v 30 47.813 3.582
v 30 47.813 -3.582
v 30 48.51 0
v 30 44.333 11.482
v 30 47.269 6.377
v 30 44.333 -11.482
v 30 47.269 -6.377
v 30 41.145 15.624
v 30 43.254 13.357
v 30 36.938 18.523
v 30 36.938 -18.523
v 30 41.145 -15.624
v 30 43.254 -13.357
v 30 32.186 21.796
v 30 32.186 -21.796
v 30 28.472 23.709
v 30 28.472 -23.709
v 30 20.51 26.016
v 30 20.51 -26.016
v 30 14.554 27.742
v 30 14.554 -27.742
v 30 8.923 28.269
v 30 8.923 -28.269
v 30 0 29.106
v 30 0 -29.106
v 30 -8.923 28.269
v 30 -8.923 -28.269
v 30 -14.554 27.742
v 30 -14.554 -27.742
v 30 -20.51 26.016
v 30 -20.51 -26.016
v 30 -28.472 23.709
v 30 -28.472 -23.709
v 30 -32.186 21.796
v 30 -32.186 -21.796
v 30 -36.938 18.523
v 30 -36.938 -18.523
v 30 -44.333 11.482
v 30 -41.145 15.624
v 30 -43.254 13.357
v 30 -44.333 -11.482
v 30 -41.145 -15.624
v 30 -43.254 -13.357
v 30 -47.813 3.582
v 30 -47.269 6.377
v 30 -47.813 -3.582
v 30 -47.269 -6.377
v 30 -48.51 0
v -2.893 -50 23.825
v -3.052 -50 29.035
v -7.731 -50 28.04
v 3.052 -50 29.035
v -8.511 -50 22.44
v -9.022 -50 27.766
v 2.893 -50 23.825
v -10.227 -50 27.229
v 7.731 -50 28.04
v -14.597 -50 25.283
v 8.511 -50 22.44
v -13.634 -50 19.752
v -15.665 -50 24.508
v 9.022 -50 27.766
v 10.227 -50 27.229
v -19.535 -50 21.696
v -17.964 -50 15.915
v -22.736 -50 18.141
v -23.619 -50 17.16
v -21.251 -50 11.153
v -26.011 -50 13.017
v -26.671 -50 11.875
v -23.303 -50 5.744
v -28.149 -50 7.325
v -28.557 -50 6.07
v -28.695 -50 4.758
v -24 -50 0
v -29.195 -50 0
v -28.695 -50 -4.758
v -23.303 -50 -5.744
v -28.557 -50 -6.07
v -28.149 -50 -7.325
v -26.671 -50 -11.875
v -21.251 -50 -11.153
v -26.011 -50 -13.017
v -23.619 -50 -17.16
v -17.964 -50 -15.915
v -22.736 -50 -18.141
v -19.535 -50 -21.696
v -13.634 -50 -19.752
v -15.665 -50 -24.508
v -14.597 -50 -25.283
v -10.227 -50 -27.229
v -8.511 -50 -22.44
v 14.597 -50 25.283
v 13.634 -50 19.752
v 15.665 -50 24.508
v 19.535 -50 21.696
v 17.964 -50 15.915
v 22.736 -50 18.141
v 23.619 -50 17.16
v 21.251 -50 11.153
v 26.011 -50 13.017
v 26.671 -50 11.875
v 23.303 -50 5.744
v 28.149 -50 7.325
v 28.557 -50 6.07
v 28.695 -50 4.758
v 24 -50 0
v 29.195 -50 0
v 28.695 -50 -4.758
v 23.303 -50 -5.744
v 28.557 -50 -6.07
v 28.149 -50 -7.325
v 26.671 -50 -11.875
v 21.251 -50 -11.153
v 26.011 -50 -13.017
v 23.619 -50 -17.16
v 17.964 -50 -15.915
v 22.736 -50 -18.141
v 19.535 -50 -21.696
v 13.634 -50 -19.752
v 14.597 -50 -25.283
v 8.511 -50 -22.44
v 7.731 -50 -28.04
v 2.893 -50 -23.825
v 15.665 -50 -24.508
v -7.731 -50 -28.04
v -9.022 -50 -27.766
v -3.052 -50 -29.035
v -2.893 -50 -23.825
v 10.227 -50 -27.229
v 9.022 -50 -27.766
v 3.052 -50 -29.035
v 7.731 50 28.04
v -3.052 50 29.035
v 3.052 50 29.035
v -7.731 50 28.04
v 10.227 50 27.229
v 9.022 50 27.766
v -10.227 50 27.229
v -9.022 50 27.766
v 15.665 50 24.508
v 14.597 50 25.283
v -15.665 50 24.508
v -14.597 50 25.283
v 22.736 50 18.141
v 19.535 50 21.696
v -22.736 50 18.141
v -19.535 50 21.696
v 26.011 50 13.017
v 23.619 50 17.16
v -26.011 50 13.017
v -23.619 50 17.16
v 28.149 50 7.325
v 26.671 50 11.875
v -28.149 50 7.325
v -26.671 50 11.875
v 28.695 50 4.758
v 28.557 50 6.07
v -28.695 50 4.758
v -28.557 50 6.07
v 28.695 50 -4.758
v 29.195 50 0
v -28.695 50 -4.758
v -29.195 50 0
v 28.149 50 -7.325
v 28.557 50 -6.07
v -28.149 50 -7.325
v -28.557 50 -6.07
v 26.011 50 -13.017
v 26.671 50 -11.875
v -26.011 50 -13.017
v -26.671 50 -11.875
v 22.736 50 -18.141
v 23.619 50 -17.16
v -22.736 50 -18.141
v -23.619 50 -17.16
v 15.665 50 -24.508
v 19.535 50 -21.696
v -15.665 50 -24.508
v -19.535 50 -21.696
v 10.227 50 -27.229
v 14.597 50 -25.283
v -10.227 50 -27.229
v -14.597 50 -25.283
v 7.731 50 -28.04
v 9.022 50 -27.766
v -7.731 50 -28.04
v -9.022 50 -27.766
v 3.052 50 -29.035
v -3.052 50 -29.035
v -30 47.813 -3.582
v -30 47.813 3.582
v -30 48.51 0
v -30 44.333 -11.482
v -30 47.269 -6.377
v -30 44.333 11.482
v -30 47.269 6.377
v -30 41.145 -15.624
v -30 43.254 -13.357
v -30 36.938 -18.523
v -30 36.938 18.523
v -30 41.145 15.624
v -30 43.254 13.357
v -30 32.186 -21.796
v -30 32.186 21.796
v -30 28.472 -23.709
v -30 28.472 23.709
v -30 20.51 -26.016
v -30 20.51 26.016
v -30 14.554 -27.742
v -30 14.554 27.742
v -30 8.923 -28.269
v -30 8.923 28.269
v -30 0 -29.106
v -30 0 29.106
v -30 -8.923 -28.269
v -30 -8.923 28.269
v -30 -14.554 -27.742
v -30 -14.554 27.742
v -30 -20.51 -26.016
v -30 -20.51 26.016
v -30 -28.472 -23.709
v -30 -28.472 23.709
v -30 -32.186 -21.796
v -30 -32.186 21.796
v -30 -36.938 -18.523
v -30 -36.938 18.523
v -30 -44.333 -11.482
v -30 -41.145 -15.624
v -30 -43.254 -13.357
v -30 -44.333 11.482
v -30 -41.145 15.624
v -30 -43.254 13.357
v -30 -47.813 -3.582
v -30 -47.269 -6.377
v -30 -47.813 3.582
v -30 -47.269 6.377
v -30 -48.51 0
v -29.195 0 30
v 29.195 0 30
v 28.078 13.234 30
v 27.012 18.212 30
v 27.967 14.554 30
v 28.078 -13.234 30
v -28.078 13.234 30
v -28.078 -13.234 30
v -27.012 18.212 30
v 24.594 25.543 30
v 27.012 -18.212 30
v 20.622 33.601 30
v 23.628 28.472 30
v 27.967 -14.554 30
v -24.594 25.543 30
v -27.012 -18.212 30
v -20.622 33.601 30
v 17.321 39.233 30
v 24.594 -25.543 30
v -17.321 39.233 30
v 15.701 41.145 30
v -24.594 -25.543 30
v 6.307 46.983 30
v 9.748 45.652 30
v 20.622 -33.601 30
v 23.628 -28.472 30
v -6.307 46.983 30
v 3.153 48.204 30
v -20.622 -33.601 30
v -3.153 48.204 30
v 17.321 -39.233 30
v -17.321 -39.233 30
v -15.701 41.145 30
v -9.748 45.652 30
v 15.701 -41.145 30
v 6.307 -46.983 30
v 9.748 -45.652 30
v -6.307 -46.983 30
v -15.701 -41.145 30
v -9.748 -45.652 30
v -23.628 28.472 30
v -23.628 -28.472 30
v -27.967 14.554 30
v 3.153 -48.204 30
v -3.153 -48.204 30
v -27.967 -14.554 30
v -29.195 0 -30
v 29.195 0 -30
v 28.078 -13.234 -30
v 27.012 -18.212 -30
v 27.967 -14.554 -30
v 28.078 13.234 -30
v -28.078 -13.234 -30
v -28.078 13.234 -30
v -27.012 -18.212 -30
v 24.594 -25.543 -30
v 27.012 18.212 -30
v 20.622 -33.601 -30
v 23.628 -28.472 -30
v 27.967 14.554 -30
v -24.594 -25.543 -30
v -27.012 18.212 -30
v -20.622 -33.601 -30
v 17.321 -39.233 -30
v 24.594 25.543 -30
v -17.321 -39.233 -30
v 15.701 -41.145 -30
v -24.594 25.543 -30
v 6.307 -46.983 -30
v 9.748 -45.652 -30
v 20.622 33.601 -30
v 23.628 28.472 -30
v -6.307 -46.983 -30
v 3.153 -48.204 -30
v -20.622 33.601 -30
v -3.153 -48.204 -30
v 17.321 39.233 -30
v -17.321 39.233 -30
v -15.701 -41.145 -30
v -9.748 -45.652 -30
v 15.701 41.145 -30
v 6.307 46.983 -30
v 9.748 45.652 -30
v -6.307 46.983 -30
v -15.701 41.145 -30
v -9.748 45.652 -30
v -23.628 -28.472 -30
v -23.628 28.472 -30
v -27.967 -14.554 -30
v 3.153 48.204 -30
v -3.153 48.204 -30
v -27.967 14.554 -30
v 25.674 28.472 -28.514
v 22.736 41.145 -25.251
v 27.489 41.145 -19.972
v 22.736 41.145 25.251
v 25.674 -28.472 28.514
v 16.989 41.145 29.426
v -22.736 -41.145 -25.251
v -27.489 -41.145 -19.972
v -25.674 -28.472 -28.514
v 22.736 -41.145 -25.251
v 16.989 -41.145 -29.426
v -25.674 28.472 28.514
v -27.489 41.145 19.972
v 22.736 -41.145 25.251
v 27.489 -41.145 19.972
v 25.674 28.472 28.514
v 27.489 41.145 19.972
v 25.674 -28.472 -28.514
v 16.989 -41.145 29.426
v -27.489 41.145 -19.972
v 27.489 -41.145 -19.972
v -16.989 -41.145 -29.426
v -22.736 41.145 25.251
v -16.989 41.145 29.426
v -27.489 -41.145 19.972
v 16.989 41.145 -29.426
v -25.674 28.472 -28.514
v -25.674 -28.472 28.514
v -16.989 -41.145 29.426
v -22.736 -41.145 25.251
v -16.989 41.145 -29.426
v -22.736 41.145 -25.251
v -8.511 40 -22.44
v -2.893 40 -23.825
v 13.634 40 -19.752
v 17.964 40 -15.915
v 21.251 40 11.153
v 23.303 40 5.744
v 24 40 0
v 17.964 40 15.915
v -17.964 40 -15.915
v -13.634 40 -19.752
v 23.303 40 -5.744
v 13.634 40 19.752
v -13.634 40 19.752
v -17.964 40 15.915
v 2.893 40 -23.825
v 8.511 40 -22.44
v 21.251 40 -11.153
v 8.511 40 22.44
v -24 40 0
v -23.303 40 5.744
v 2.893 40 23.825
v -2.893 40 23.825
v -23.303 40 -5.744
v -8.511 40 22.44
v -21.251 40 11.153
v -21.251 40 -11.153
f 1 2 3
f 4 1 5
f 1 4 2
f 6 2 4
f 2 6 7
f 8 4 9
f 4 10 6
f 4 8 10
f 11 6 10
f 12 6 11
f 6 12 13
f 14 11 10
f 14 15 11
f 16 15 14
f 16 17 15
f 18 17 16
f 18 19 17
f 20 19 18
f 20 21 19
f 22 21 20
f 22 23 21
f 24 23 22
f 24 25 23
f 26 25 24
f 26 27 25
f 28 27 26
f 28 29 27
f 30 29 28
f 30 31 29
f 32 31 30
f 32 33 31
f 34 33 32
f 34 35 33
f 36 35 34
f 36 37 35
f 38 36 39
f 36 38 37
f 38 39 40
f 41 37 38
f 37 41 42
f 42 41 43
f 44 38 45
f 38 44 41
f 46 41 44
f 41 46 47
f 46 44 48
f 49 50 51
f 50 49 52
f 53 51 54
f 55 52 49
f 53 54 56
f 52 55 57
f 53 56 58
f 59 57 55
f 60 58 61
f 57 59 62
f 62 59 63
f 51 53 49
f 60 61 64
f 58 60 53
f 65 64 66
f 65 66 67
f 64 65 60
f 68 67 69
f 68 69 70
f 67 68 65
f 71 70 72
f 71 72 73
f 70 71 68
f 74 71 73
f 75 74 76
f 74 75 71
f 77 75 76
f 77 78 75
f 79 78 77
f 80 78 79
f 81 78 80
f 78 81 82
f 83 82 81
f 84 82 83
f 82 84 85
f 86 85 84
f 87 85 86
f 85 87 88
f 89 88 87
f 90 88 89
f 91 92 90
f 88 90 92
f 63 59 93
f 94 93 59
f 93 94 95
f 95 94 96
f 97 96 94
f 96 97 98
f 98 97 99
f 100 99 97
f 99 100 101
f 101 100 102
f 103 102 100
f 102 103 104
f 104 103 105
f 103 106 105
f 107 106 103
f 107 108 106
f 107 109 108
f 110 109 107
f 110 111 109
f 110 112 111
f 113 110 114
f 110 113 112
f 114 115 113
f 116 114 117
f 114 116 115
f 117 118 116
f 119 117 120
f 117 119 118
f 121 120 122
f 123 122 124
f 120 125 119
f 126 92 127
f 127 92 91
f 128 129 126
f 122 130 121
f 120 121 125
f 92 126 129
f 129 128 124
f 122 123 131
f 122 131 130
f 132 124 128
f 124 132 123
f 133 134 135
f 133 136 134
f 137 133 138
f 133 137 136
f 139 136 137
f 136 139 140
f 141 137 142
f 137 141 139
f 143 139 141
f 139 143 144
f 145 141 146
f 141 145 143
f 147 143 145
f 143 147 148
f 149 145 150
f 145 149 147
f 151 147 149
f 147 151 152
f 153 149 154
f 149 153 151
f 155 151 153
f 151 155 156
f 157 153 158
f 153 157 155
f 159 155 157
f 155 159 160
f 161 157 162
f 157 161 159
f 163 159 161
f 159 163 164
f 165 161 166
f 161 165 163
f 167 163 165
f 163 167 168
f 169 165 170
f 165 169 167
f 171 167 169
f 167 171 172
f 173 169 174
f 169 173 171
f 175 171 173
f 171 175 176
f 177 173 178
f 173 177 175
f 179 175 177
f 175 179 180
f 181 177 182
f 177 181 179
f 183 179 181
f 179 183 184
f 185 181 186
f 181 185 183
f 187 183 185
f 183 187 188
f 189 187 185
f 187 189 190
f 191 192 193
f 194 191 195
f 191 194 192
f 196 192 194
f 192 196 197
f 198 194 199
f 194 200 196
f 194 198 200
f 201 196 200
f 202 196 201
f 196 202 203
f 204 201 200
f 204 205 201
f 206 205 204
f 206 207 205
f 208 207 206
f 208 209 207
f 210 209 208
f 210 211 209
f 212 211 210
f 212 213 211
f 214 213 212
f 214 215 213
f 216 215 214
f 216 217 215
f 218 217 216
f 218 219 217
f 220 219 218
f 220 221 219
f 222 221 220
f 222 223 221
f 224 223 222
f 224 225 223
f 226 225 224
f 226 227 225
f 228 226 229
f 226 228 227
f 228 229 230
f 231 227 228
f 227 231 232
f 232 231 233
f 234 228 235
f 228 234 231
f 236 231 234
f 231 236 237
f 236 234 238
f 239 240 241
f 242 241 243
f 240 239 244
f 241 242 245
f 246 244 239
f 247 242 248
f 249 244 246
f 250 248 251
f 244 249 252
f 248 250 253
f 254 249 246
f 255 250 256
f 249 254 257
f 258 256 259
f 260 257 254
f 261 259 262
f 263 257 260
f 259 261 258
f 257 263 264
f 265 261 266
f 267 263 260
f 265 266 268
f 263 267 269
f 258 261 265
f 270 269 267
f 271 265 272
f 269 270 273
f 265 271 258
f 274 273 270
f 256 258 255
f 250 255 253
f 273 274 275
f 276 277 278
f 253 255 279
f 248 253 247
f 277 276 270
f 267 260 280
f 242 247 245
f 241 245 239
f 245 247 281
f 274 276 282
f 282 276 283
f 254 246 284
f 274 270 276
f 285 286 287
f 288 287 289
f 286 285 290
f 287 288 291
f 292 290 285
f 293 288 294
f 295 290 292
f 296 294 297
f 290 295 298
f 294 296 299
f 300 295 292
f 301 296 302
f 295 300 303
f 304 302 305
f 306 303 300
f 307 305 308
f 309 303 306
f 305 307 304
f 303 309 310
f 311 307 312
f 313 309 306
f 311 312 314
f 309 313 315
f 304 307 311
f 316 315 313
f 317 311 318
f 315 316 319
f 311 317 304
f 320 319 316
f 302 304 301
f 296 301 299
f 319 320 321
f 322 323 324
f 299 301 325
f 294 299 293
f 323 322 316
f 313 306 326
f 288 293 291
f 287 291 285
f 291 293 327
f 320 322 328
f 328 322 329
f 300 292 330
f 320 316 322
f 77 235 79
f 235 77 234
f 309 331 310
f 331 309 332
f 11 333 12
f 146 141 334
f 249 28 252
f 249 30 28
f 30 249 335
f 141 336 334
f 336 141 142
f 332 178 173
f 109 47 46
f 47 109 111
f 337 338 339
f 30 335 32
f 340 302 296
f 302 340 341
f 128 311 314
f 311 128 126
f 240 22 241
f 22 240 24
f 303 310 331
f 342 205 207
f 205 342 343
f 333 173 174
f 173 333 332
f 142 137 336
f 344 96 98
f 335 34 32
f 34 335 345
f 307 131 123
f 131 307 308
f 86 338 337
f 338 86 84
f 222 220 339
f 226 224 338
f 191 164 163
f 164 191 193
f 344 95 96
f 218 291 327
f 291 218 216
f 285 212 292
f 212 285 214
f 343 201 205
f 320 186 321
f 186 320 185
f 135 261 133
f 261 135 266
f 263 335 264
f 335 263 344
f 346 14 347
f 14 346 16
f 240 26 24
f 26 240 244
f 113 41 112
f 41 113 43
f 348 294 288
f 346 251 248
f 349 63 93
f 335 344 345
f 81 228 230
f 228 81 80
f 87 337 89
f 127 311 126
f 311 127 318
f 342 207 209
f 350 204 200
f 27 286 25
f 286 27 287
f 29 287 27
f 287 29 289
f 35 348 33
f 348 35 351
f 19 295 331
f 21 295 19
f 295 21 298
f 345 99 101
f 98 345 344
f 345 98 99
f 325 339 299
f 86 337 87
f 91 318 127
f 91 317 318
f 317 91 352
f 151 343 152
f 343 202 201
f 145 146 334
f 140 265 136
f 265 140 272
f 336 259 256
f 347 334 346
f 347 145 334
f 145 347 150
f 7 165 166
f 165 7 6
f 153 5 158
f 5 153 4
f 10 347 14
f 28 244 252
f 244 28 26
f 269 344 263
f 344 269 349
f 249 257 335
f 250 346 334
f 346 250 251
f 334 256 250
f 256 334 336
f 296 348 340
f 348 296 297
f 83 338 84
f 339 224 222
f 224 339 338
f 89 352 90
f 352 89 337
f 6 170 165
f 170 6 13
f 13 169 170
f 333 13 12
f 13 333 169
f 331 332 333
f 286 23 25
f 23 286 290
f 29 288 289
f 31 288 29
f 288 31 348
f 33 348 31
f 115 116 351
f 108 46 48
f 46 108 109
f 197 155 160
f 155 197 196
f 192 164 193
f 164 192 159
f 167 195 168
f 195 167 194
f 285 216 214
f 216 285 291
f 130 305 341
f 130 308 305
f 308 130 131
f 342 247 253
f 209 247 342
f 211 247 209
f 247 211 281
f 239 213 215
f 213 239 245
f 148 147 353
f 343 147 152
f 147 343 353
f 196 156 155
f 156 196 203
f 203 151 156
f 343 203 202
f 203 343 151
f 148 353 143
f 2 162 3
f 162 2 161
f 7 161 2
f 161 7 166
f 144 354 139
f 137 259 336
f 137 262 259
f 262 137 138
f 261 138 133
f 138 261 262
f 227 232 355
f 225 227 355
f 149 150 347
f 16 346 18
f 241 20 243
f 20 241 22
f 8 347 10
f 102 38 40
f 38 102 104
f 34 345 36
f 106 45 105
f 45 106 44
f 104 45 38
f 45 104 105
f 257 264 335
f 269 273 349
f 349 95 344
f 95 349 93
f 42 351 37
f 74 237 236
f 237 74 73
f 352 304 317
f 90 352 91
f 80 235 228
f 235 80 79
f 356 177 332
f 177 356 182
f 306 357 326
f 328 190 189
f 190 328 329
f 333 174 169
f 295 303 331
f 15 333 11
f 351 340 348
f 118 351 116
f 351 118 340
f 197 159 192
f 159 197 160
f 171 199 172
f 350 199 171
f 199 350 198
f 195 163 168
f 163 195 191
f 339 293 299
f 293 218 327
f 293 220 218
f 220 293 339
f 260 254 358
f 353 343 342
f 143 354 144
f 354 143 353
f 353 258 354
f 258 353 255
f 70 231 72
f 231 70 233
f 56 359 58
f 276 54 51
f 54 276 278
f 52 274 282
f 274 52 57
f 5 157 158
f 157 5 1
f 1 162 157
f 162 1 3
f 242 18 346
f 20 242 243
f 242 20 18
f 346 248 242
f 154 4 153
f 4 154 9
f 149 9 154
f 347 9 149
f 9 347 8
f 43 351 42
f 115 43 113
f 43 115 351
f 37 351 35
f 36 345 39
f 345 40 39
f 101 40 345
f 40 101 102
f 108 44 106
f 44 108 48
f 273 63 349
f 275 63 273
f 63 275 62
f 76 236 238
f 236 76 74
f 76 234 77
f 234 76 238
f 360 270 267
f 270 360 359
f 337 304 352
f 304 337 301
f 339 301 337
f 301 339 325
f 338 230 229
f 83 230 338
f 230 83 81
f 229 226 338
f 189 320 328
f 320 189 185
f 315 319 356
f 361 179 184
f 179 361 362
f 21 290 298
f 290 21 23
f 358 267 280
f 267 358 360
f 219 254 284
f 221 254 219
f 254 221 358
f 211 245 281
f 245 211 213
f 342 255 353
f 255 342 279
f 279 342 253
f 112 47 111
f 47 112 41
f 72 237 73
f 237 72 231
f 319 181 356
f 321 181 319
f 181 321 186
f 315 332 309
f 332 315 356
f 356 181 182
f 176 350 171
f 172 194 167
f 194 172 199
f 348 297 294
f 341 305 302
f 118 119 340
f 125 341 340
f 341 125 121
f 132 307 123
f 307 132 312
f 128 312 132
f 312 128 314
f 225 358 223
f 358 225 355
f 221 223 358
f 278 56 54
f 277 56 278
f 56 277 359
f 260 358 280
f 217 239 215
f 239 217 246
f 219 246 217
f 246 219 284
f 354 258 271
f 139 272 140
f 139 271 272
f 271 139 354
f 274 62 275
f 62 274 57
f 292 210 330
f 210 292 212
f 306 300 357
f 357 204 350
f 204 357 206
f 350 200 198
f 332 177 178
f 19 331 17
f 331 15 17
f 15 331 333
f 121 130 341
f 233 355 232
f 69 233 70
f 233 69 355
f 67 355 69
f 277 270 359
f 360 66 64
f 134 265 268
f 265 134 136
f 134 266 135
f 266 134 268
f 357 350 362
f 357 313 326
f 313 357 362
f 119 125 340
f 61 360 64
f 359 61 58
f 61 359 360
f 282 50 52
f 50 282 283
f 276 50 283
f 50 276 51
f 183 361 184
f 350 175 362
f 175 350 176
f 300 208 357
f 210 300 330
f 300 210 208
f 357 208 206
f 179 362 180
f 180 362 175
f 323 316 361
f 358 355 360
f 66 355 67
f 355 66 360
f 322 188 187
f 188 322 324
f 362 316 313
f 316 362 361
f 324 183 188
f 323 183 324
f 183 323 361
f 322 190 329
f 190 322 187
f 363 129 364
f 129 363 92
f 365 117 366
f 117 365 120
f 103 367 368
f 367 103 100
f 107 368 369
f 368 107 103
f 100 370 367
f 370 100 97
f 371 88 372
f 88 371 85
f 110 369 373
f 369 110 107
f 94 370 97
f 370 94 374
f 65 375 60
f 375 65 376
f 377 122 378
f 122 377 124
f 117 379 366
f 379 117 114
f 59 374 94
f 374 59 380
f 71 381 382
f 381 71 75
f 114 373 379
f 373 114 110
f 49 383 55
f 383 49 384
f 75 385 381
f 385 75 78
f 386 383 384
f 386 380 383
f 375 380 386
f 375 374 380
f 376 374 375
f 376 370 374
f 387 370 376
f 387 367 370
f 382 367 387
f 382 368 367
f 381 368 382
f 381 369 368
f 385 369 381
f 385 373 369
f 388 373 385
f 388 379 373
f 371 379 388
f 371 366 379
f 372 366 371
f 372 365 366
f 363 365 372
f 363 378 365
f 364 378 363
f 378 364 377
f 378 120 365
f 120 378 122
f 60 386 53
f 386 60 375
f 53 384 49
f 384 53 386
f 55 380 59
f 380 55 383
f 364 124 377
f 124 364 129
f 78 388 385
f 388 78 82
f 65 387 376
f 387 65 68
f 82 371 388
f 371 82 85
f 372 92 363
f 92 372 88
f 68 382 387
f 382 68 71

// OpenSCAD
rotate ([90,0,0]) {
scale([3,3,5]) {
difference () {
intersection () {
    cube([20,20,20], center=true) ;
    sphere(14);
}
translate([0,0,-8])
   cylinder (r=8, h=22);
}
}
}
